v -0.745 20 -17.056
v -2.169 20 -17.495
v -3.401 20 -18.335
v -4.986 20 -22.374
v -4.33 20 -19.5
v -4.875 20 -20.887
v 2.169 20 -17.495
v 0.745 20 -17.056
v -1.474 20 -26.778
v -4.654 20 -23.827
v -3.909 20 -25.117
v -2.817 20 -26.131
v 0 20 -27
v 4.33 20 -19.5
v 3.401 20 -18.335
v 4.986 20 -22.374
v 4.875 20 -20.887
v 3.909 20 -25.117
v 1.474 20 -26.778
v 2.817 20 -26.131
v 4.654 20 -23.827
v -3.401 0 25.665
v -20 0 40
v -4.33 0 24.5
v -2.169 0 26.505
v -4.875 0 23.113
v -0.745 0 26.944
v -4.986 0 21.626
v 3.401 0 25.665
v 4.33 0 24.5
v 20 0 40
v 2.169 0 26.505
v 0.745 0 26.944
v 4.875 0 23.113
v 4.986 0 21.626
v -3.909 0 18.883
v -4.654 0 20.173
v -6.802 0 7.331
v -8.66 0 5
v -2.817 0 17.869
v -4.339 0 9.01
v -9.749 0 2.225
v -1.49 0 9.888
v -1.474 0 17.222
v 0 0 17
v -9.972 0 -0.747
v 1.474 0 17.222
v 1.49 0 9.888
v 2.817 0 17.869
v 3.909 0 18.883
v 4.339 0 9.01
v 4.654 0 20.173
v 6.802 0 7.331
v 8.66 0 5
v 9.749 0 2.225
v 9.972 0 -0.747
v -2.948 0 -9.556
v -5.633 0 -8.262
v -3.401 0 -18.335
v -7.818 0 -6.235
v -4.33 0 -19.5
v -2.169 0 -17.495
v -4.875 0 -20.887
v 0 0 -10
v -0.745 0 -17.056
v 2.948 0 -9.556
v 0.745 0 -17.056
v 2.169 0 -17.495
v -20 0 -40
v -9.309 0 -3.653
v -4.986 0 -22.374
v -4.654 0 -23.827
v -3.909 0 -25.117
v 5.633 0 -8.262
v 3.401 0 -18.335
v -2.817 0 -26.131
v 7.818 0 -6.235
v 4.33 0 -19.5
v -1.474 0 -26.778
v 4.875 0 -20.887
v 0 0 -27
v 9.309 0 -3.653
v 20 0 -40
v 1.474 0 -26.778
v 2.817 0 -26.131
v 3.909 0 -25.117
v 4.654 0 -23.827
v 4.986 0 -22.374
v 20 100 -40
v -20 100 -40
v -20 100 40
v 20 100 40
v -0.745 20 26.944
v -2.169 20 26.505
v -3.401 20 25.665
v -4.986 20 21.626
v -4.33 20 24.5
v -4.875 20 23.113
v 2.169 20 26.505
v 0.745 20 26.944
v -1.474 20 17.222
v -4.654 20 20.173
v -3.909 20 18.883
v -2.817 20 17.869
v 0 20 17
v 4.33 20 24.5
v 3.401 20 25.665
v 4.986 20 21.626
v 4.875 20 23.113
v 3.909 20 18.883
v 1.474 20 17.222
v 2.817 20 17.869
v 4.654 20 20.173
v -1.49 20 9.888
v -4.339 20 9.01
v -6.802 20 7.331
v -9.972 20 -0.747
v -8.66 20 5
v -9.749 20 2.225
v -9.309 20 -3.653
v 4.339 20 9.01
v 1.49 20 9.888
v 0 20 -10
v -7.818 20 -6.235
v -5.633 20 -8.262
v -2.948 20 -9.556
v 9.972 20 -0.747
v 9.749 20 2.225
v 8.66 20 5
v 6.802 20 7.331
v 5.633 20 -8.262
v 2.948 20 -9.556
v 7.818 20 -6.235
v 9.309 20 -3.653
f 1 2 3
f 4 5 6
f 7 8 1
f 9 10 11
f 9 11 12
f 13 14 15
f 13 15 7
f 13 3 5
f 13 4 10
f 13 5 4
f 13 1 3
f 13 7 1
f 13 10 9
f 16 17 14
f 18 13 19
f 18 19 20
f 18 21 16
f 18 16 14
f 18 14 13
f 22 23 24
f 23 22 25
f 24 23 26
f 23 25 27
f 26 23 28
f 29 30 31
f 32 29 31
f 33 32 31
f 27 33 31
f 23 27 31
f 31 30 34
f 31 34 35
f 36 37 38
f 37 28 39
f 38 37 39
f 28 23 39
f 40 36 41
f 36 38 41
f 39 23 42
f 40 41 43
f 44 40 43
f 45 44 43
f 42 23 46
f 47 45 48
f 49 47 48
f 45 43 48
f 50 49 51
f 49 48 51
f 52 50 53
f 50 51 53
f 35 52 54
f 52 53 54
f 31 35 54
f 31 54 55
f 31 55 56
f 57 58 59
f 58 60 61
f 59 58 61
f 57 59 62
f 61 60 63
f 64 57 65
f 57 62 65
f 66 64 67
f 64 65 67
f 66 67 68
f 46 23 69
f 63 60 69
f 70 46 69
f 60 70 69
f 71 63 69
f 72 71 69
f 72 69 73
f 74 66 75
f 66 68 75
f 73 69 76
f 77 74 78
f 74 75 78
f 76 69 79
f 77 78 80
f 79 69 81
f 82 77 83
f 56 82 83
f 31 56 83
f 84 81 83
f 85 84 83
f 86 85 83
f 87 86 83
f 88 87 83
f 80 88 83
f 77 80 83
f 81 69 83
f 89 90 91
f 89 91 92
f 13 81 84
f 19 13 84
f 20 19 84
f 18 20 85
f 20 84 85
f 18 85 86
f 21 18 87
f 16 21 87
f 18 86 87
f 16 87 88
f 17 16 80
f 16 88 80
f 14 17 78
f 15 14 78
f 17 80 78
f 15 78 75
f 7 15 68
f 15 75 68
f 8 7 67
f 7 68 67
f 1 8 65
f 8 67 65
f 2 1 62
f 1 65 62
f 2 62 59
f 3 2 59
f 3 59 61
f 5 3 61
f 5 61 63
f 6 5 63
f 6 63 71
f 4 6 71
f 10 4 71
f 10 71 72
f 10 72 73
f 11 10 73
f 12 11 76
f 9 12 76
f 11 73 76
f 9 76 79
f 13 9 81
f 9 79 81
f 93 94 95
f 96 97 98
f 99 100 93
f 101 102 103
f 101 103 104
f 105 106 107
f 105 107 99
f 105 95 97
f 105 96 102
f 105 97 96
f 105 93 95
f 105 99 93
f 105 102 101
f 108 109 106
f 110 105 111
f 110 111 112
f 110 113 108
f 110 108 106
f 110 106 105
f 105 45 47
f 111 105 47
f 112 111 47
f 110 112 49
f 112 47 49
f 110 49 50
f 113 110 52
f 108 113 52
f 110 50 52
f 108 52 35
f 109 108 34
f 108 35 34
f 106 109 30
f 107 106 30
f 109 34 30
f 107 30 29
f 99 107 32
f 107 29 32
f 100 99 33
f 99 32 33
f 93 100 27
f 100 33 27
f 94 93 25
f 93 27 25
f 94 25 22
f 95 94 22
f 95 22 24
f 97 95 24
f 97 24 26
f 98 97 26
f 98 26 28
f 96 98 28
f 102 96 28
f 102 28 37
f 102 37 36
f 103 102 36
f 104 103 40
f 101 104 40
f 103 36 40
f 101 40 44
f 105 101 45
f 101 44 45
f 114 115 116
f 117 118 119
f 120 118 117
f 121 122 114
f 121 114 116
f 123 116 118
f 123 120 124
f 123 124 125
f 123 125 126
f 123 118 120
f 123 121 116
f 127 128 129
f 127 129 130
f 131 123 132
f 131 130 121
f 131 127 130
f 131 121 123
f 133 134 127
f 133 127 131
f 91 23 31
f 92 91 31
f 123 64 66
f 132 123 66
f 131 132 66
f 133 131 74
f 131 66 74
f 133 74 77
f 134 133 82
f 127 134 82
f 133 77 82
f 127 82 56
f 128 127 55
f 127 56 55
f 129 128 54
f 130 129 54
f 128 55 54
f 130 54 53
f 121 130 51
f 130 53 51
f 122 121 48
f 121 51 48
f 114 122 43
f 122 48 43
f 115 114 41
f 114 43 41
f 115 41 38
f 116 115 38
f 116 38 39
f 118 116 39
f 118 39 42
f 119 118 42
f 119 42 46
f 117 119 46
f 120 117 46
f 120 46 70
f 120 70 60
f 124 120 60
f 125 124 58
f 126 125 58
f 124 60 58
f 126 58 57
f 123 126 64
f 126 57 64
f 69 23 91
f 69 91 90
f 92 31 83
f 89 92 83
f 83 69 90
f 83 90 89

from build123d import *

# Parameters (mm, degrees)
SKETCH1_W           = 40
SKETCH1_H           = 80
BOSS_EXTRUDE1_DEPTH = 100
SKETCH3_R           = 10
SKETCH3_R_2         = 5
CUT_EXTRUDE2_DEPTH  = 20


with BuildPart() as part:
    # Sketch1 → Boss-Extrude1 (new body)
    with BuildSketch(Plane(origin=(0, 0, 0), x_dir=(1, 0, 0), z_dir=(0, 1, 0))):
        Rectangle(SKETCH1_W, SKETCH1_H)
    extrude(amount=BOSS_EXTRUDE1_DEPTH)

    # Sketch3 → Cut-Extrude2 (cut)
    with BuildSketch(Plane.XZ):
        with Locations(Location((0, 0, 0), (0, 0, 270))):
            Circle(SKETCH3_R)
        with Locations(Location((0, 22, 0), (0, 0, 270))):
            Circle(SKETCH3_R_2)
        with Locations(Location((0, -22, 0), (0, 0, 270))):
            Circle(SKETCH3_R_2)
    extrude(amount=-CUT_EXTRUDE2_DEPTH, mode=Mode.SUBTRACT)


solid = part.part
